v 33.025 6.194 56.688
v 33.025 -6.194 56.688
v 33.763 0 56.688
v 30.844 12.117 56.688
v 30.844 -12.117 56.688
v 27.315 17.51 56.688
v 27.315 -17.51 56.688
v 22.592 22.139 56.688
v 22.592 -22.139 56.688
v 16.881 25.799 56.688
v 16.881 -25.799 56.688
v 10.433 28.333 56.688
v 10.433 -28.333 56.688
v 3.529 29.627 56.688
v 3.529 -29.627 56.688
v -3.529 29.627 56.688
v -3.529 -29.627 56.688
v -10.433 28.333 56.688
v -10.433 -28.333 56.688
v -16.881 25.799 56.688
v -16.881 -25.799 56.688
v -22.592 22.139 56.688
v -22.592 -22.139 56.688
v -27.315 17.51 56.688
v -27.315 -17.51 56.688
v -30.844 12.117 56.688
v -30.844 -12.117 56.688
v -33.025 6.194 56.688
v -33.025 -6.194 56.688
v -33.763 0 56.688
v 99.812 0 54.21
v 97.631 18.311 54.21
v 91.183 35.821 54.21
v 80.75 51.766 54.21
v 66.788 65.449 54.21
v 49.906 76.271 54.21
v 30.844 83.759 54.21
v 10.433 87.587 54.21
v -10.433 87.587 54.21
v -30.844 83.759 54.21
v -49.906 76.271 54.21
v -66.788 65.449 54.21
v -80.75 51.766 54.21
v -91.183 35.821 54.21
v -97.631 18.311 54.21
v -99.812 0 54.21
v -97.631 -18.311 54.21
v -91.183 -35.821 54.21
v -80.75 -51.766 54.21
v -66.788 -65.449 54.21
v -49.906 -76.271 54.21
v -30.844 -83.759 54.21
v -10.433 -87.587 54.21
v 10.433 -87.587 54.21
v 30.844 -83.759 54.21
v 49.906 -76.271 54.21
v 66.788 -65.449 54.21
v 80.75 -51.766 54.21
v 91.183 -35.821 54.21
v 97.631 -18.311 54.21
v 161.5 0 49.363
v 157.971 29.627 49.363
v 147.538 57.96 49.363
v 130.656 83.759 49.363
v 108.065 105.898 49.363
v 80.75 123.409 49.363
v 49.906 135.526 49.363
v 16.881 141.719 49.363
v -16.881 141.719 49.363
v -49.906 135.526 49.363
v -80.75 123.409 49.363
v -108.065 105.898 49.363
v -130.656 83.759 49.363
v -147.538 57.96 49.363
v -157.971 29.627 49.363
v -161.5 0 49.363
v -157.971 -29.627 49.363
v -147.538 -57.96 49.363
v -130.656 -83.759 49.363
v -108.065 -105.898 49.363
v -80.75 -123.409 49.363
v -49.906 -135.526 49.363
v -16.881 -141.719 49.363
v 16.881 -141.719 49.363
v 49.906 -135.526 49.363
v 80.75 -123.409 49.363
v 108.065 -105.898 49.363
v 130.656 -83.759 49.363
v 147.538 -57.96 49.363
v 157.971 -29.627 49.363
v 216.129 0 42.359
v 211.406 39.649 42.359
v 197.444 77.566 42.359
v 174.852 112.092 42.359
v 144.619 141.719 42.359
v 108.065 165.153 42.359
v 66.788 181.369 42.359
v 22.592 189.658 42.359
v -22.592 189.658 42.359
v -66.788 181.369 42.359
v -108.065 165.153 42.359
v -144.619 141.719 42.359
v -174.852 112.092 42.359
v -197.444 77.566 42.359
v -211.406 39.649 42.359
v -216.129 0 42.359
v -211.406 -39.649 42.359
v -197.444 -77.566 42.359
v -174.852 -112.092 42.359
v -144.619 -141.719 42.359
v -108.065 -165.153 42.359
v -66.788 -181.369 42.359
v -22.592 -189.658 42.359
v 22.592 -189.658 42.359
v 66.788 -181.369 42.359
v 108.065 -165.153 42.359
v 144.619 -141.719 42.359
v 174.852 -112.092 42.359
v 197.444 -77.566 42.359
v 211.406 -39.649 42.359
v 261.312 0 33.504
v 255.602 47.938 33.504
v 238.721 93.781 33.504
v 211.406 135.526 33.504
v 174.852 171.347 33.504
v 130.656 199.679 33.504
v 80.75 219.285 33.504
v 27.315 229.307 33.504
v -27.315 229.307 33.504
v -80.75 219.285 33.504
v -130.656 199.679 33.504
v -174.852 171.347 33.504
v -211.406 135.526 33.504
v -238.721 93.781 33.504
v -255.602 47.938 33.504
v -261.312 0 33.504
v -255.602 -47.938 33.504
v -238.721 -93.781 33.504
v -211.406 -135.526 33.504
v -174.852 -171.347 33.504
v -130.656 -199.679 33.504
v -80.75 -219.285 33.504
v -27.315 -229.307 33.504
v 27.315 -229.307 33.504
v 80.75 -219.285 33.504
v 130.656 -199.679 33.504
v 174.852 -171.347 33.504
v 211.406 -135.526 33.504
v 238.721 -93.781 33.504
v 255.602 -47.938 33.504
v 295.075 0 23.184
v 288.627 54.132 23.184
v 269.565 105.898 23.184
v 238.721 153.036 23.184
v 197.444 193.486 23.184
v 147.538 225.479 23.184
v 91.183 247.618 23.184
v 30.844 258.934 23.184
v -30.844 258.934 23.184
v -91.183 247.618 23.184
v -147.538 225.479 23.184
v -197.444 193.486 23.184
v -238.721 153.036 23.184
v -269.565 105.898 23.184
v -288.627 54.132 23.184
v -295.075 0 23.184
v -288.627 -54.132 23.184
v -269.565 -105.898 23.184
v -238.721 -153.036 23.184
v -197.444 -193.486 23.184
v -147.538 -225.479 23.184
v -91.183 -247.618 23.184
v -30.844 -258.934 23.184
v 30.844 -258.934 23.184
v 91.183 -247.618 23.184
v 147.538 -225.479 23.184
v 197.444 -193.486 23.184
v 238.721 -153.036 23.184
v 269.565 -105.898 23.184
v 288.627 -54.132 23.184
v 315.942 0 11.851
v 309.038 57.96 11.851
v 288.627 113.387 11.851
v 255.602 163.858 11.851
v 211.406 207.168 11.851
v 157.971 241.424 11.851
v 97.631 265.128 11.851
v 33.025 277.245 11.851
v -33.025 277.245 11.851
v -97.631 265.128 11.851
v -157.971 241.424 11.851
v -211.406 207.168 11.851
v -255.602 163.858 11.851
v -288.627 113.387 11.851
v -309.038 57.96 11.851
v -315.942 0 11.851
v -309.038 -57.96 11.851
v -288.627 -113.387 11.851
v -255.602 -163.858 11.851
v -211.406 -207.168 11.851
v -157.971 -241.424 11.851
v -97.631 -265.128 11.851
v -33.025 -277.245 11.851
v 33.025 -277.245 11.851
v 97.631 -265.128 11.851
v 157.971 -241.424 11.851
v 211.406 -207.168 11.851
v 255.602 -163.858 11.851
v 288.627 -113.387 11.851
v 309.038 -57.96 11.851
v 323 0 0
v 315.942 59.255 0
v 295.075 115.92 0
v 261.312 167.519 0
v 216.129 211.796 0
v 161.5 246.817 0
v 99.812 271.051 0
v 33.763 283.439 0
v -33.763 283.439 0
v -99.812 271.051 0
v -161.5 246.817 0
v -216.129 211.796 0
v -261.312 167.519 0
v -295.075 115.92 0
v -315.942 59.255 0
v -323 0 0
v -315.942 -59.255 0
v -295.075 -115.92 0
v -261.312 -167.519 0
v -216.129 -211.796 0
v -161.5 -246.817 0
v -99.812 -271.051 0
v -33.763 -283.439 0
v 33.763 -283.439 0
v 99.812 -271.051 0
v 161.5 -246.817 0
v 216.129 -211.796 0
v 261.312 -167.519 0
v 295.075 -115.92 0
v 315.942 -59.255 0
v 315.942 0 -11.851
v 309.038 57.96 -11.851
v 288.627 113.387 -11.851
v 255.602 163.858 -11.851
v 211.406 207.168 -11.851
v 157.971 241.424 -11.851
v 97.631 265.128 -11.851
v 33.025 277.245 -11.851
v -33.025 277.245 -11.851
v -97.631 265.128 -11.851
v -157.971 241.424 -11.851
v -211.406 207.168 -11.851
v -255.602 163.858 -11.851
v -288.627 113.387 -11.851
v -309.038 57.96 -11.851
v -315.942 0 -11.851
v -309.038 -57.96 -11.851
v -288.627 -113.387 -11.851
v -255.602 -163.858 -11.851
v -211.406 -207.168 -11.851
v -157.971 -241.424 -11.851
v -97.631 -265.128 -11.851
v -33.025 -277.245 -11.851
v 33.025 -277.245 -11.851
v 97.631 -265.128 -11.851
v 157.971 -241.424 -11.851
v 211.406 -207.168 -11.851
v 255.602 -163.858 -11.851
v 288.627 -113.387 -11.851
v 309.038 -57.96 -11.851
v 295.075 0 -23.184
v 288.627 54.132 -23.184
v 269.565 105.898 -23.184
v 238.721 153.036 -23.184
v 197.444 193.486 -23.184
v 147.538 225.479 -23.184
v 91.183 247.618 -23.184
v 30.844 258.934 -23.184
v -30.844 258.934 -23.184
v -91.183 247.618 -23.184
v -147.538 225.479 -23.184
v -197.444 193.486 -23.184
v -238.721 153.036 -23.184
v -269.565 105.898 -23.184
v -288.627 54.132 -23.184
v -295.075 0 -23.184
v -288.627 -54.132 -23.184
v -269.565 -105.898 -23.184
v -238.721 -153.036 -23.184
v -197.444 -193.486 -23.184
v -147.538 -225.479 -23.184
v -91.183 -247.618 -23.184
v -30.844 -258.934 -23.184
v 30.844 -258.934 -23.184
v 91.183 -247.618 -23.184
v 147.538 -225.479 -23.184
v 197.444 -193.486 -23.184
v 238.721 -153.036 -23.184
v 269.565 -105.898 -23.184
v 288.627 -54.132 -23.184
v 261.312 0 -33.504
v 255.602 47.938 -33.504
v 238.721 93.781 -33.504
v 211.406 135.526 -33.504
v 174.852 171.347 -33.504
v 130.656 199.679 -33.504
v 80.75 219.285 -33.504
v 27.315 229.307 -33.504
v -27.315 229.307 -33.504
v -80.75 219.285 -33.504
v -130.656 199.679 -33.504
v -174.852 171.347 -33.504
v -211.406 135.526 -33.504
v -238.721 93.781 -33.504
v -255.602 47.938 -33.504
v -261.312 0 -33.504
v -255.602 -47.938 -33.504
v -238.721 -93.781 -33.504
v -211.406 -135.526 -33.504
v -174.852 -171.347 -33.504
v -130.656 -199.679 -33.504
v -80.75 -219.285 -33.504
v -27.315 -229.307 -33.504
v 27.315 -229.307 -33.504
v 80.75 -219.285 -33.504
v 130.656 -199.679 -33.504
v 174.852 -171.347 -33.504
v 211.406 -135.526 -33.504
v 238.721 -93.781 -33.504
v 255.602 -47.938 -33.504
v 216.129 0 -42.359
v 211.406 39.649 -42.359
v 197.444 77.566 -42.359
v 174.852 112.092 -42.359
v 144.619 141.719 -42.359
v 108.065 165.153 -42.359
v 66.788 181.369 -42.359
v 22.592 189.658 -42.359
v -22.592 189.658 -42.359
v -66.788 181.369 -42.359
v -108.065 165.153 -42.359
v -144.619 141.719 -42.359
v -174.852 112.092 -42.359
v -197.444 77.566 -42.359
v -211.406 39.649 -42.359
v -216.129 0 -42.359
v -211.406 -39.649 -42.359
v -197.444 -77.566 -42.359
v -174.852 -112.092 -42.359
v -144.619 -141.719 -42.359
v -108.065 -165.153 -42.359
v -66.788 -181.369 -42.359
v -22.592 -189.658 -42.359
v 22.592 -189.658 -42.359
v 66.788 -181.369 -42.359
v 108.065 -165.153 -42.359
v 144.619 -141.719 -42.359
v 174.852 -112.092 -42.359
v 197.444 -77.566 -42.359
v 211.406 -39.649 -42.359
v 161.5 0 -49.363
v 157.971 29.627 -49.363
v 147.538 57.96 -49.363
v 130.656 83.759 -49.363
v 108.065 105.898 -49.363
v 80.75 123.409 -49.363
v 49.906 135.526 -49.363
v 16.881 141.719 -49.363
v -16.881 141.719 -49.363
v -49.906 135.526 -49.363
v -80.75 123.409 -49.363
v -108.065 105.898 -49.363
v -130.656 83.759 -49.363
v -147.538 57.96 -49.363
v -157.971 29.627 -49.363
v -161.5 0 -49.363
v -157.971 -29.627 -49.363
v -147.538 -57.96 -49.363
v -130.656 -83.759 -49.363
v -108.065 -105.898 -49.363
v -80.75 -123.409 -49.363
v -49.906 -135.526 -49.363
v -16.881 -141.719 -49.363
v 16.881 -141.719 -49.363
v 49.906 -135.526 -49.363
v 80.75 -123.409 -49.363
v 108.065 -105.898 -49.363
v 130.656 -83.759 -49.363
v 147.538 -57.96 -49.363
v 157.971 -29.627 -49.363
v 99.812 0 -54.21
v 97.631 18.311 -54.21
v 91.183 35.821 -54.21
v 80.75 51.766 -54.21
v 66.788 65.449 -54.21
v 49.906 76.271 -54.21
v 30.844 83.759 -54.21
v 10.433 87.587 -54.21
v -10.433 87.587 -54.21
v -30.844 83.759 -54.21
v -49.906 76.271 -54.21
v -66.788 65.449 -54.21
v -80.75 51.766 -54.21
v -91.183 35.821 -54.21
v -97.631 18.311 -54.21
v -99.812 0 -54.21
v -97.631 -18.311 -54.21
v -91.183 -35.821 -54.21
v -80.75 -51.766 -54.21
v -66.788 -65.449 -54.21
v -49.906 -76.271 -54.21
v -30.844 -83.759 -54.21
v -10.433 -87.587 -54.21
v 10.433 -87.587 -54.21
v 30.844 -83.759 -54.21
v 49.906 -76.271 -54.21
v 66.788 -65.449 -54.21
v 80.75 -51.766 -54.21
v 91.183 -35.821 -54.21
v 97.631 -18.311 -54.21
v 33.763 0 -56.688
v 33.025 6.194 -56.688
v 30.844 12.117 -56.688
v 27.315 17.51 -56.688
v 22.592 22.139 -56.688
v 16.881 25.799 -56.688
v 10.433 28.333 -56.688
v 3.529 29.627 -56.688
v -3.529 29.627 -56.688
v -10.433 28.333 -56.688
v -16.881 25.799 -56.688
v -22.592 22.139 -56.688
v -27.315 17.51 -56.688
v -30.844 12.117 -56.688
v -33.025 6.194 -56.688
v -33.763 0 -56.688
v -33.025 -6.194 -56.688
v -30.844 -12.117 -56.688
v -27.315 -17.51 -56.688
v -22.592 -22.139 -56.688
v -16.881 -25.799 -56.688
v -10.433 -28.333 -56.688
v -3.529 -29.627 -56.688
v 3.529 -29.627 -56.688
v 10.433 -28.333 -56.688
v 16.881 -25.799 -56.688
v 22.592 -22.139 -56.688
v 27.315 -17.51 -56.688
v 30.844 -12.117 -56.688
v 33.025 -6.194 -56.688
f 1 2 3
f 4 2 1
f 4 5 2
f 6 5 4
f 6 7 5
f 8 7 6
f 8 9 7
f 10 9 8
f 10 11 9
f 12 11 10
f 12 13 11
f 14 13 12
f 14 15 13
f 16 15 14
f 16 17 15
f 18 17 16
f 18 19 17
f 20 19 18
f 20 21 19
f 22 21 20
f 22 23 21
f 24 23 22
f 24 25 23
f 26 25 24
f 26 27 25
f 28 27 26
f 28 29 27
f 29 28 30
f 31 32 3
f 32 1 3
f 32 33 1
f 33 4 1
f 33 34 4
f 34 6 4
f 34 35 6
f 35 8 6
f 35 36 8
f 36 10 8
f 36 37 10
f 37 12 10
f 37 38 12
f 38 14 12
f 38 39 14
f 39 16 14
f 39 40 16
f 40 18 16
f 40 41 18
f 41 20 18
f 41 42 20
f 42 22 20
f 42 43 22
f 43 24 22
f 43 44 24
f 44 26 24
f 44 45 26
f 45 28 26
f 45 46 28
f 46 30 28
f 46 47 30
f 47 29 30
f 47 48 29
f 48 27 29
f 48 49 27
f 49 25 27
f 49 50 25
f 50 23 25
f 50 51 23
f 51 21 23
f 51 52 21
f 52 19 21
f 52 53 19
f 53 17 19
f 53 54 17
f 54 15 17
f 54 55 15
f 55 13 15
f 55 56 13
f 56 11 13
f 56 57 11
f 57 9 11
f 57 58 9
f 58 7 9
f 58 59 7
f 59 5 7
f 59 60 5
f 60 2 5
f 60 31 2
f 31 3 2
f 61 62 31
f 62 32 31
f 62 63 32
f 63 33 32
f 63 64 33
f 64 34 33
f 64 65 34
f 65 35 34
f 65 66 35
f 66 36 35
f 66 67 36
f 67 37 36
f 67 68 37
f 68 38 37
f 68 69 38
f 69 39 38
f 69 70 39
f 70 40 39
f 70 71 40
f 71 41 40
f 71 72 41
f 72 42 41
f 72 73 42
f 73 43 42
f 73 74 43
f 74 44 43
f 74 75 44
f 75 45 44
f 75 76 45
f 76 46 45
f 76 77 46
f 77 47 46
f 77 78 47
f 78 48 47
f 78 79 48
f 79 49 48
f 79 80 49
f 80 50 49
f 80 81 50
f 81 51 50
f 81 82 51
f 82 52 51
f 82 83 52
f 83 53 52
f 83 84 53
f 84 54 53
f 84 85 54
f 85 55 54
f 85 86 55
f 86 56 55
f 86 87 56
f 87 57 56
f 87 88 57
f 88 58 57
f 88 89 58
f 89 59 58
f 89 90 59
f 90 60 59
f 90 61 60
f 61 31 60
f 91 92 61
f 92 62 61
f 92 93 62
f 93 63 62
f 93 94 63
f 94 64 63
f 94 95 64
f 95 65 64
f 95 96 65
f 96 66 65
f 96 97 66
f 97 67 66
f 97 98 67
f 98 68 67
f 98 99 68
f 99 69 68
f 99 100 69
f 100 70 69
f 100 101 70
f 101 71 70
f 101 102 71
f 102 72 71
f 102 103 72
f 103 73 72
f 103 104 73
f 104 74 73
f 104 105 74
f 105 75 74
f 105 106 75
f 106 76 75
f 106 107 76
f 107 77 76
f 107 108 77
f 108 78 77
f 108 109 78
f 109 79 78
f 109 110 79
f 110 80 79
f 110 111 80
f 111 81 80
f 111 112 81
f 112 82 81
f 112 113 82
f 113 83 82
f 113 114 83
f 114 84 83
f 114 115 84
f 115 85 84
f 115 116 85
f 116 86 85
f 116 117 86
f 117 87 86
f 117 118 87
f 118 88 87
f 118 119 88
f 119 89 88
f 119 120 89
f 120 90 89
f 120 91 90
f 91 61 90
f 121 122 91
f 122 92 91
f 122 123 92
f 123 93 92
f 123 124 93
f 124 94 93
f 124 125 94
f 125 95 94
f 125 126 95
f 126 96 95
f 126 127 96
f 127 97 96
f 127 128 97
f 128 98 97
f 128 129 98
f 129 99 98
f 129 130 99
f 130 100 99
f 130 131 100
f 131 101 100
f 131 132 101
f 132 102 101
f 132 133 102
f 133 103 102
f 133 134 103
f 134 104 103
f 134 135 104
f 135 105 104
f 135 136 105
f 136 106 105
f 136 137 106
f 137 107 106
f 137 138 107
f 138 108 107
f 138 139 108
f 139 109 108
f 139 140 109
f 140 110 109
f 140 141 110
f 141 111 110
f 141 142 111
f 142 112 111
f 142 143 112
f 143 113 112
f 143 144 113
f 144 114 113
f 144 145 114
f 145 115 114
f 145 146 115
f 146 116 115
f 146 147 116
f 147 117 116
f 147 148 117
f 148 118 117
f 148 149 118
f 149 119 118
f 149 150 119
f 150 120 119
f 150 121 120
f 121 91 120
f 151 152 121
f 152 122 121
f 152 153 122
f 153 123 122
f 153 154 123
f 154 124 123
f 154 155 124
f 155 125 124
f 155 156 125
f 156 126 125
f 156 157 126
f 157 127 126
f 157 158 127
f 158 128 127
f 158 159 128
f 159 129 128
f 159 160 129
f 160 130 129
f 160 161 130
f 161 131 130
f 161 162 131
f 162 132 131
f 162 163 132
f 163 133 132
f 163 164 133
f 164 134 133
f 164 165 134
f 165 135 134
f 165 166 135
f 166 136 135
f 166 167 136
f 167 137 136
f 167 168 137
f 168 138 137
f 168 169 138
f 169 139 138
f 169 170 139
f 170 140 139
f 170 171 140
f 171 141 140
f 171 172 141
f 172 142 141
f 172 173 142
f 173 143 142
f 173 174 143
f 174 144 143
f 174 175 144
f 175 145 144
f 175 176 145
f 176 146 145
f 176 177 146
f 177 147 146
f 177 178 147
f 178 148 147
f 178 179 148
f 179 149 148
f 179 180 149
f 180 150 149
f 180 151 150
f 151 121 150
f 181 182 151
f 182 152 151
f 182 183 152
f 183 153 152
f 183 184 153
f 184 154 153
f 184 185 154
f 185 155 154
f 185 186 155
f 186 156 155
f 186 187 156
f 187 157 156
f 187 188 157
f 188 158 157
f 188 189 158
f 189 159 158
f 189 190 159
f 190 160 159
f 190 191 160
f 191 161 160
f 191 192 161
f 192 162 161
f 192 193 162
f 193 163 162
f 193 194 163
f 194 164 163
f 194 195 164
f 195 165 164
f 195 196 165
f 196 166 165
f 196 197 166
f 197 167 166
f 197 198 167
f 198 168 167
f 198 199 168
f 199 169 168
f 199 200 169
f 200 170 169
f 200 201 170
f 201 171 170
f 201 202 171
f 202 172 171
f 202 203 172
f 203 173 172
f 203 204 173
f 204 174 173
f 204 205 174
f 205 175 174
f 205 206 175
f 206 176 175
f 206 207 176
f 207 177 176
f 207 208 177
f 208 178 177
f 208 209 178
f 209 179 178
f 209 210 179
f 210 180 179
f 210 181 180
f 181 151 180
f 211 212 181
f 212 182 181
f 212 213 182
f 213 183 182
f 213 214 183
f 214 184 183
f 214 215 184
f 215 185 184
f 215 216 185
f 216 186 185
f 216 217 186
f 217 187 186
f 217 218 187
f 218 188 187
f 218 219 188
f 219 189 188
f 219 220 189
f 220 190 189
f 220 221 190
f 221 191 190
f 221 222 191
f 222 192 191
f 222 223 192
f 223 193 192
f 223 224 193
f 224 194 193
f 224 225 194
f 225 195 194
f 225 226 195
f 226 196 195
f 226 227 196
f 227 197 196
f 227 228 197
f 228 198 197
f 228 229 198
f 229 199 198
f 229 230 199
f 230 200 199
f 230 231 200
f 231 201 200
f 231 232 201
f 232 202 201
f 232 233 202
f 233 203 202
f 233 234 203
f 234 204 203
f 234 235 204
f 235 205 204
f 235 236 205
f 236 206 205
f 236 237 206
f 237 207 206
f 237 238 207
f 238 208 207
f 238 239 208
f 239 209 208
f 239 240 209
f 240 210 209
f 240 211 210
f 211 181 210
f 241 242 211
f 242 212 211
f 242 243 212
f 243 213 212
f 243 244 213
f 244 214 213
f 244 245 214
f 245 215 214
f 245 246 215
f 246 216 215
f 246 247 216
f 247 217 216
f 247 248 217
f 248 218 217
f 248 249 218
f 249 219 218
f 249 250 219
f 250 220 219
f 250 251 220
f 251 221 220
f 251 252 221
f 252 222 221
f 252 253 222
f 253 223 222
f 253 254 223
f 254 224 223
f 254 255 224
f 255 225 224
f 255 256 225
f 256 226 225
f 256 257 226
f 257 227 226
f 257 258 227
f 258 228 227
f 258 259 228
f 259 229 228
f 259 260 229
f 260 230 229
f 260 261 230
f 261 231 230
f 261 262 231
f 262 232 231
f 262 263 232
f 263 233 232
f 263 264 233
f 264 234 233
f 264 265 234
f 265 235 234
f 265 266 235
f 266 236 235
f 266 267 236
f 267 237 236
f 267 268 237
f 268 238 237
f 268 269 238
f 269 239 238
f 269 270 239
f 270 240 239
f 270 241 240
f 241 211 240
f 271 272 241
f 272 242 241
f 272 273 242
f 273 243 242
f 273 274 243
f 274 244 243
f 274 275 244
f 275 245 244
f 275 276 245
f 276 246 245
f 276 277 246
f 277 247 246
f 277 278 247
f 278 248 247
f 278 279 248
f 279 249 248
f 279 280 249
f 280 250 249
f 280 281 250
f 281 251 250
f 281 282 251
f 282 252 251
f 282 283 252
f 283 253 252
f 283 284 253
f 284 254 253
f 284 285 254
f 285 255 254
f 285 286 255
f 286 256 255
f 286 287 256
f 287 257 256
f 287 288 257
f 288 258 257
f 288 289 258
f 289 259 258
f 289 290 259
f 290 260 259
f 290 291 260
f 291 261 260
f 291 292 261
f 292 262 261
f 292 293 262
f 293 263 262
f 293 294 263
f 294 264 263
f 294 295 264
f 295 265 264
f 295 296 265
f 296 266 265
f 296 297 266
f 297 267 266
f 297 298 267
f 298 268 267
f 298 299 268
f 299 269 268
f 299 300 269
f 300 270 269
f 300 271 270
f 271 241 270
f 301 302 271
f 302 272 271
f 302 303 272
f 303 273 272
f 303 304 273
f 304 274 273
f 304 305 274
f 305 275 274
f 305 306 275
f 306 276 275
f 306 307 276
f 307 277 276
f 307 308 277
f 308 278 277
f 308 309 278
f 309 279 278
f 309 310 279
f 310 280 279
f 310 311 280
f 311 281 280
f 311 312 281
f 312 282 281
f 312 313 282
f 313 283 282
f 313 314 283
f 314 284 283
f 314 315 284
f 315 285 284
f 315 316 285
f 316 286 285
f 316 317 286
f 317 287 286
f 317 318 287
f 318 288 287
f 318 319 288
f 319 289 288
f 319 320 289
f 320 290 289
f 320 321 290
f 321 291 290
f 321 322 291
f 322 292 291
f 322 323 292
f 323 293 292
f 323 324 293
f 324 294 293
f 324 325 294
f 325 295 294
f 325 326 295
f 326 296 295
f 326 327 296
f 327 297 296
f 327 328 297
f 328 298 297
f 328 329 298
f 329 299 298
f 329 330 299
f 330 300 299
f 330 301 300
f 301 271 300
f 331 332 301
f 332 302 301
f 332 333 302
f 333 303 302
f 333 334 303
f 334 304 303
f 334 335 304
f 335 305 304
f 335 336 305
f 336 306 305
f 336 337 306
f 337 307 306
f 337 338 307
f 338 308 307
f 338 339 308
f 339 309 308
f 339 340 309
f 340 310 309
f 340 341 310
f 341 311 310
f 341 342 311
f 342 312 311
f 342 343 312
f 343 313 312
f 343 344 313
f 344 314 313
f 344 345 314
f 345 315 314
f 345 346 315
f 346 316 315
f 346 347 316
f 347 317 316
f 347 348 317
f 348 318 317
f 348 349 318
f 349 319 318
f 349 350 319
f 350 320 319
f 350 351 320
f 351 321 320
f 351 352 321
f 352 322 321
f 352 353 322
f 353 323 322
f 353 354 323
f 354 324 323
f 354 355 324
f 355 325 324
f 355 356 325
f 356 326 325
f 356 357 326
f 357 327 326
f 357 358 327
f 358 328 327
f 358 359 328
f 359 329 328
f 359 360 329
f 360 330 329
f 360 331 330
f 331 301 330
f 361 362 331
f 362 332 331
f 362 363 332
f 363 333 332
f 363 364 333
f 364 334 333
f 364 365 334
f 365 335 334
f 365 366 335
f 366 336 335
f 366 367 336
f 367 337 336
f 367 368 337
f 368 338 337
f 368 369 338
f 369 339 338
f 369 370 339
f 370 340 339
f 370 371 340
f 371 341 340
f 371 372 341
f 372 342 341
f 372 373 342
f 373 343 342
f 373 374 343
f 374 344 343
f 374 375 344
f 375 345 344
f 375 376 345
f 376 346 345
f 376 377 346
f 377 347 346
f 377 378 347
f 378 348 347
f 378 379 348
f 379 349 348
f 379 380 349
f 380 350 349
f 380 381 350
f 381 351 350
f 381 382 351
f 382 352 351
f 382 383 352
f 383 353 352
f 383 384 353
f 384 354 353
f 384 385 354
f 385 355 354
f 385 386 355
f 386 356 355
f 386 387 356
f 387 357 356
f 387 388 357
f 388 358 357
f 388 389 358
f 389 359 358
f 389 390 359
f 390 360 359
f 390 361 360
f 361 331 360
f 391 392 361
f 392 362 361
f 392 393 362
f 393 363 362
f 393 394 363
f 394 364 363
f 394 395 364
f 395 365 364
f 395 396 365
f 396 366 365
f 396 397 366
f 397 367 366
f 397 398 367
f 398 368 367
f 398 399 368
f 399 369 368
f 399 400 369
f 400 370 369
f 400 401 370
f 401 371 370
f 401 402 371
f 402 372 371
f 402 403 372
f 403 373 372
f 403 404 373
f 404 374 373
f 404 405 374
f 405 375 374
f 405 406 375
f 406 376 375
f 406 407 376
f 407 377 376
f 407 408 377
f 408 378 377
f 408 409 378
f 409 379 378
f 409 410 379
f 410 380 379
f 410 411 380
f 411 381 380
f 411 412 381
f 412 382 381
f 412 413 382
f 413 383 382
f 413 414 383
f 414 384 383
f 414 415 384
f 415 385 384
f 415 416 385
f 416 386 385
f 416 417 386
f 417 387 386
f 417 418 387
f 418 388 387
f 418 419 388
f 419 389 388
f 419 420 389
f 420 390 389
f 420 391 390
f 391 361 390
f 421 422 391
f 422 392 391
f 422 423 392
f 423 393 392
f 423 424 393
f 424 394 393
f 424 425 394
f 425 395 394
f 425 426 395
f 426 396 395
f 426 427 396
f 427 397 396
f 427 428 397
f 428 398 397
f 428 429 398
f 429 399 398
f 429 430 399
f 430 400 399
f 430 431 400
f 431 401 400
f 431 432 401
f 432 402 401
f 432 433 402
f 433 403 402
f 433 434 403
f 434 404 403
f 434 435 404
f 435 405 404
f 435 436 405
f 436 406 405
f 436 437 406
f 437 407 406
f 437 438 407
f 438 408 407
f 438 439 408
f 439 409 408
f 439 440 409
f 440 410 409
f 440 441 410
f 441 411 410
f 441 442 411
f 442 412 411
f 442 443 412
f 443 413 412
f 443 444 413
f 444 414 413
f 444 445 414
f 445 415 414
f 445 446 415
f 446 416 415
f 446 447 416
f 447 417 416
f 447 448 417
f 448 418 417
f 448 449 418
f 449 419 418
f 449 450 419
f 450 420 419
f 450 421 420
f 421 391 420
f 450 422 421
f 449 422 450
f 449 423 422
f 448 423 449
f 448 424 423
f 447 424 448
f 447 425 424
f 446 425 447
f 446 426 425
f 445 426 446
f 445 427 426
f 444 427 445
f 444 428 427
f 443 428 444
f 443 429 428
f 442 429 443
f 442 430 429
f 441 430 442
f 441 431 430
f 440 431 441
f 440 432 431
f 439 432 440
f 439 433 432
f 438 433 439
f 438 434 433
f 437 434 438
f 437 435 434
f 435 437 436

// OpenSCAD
// Generated by SolidPython 1.0.1 on 2020-07-29 00:46:53


scale(v = [17, 15, 3]) {
	sphere(r = 19);
}
/***********************************************
*********      SolidPython code:      **********
************************************************
 
# import packages: SolidPython
from solid import *
from solid.utils import *
from itertools import chain, combinations, permutations


class Resize:

    def __init__(self, scad_file):
        self.scad_file = scad_file
        #self.scad_file = import_scad(scad_file)
        # cone/cylinder param:
        self.r1 = 0
        self.r2 = 0
        self.h = 0
        # rectangular prism param:
        self.w = 0
        self.l = 0
        # ellipse param:
        self.r = 0

    # import OpenScad code (file name corresponds to shape)


    # classify shape + parameters
    def assign(self, param1, param2, param3):
        if self.scad_file == 'cone.scad':
            self.r1 = param1
            self.r2 = param2
            self.h = param3
        elif self.scad_file == 'cylinder.scad':
            self.r1 = param1
            self.r2 = param2
            self.h = param3
        elif self.scad_file == 'rectangularPrism.scad':
            self.h = param1
            self.l = param2
            self.w = param3
        else:
            self.r = param1
            self.h = param2

    # resize parameters
    def iterate(self):
        x = range(3, 20, 2)
        i = 1
        if self.scad_file == 'cone.scad':
            tempList = list(permutations(x, 2))
            for temp in tempList:
                param1 = temp[0]
                param2 = temp[1]
                filepath = 'produced_scad_files/' + 'cone' + str(param1) + '_' + str(param2) + '_' + '.scad'
                scad_render_to_file(cylinder(h=param1, r1=param2, r2=0), filepath)

        elif self.scad_file == 'cylinder.scad':
            tempList = list(permutations(x, 3))
            for temp in tempList:
                param1 = temp[0]
                param2 = temp[1]
                filepath = 'produced_scad_files/' + 'cylinder' + str(param1) + '_' + str(param2) + '_' + '.scad'
                scad_render_to_file(cylinder(h=param1, r1=param2, r2=param2), filepath)

        elif self.scad_file == 'rectangularPrism.scad':
            tempList = list(permutations(x, 3))
            for temp in tempList:
                param1 = temp[0]
                param2 = temp[1]
                param3 = temp[2]
                filepath = 'produced_scad_files/' + 'rectangularPrism' + str(param1) + '_' + str(param2) + '_' + str(
                    param3) + '.scad'
                scad_render_to_file(cube(size=(param1, param2, param3)), filepath)

        elif self.scad_file == 'ellipse.scad':
            tempList = list(permutations(x, 4))
            for temp in tempList:
                param1 = temp[0]
                param2 = temp[1]
                param3 = temp[2]
                param4 = temp[3]
                filepath = 'produced_scad_files/' + 'ellipse' + str(param1) + '_' + str(param2) + '_' + str(param3) + '_' + str(param4) + '.scad'
                scad_render_to_file(scale([param1, param2, param3])(sphere(r=param4)), filepath)

    def render_to_scadfile(self):
        scad_render_to_file(scad, 'example.scad') 
 
************************************************/
